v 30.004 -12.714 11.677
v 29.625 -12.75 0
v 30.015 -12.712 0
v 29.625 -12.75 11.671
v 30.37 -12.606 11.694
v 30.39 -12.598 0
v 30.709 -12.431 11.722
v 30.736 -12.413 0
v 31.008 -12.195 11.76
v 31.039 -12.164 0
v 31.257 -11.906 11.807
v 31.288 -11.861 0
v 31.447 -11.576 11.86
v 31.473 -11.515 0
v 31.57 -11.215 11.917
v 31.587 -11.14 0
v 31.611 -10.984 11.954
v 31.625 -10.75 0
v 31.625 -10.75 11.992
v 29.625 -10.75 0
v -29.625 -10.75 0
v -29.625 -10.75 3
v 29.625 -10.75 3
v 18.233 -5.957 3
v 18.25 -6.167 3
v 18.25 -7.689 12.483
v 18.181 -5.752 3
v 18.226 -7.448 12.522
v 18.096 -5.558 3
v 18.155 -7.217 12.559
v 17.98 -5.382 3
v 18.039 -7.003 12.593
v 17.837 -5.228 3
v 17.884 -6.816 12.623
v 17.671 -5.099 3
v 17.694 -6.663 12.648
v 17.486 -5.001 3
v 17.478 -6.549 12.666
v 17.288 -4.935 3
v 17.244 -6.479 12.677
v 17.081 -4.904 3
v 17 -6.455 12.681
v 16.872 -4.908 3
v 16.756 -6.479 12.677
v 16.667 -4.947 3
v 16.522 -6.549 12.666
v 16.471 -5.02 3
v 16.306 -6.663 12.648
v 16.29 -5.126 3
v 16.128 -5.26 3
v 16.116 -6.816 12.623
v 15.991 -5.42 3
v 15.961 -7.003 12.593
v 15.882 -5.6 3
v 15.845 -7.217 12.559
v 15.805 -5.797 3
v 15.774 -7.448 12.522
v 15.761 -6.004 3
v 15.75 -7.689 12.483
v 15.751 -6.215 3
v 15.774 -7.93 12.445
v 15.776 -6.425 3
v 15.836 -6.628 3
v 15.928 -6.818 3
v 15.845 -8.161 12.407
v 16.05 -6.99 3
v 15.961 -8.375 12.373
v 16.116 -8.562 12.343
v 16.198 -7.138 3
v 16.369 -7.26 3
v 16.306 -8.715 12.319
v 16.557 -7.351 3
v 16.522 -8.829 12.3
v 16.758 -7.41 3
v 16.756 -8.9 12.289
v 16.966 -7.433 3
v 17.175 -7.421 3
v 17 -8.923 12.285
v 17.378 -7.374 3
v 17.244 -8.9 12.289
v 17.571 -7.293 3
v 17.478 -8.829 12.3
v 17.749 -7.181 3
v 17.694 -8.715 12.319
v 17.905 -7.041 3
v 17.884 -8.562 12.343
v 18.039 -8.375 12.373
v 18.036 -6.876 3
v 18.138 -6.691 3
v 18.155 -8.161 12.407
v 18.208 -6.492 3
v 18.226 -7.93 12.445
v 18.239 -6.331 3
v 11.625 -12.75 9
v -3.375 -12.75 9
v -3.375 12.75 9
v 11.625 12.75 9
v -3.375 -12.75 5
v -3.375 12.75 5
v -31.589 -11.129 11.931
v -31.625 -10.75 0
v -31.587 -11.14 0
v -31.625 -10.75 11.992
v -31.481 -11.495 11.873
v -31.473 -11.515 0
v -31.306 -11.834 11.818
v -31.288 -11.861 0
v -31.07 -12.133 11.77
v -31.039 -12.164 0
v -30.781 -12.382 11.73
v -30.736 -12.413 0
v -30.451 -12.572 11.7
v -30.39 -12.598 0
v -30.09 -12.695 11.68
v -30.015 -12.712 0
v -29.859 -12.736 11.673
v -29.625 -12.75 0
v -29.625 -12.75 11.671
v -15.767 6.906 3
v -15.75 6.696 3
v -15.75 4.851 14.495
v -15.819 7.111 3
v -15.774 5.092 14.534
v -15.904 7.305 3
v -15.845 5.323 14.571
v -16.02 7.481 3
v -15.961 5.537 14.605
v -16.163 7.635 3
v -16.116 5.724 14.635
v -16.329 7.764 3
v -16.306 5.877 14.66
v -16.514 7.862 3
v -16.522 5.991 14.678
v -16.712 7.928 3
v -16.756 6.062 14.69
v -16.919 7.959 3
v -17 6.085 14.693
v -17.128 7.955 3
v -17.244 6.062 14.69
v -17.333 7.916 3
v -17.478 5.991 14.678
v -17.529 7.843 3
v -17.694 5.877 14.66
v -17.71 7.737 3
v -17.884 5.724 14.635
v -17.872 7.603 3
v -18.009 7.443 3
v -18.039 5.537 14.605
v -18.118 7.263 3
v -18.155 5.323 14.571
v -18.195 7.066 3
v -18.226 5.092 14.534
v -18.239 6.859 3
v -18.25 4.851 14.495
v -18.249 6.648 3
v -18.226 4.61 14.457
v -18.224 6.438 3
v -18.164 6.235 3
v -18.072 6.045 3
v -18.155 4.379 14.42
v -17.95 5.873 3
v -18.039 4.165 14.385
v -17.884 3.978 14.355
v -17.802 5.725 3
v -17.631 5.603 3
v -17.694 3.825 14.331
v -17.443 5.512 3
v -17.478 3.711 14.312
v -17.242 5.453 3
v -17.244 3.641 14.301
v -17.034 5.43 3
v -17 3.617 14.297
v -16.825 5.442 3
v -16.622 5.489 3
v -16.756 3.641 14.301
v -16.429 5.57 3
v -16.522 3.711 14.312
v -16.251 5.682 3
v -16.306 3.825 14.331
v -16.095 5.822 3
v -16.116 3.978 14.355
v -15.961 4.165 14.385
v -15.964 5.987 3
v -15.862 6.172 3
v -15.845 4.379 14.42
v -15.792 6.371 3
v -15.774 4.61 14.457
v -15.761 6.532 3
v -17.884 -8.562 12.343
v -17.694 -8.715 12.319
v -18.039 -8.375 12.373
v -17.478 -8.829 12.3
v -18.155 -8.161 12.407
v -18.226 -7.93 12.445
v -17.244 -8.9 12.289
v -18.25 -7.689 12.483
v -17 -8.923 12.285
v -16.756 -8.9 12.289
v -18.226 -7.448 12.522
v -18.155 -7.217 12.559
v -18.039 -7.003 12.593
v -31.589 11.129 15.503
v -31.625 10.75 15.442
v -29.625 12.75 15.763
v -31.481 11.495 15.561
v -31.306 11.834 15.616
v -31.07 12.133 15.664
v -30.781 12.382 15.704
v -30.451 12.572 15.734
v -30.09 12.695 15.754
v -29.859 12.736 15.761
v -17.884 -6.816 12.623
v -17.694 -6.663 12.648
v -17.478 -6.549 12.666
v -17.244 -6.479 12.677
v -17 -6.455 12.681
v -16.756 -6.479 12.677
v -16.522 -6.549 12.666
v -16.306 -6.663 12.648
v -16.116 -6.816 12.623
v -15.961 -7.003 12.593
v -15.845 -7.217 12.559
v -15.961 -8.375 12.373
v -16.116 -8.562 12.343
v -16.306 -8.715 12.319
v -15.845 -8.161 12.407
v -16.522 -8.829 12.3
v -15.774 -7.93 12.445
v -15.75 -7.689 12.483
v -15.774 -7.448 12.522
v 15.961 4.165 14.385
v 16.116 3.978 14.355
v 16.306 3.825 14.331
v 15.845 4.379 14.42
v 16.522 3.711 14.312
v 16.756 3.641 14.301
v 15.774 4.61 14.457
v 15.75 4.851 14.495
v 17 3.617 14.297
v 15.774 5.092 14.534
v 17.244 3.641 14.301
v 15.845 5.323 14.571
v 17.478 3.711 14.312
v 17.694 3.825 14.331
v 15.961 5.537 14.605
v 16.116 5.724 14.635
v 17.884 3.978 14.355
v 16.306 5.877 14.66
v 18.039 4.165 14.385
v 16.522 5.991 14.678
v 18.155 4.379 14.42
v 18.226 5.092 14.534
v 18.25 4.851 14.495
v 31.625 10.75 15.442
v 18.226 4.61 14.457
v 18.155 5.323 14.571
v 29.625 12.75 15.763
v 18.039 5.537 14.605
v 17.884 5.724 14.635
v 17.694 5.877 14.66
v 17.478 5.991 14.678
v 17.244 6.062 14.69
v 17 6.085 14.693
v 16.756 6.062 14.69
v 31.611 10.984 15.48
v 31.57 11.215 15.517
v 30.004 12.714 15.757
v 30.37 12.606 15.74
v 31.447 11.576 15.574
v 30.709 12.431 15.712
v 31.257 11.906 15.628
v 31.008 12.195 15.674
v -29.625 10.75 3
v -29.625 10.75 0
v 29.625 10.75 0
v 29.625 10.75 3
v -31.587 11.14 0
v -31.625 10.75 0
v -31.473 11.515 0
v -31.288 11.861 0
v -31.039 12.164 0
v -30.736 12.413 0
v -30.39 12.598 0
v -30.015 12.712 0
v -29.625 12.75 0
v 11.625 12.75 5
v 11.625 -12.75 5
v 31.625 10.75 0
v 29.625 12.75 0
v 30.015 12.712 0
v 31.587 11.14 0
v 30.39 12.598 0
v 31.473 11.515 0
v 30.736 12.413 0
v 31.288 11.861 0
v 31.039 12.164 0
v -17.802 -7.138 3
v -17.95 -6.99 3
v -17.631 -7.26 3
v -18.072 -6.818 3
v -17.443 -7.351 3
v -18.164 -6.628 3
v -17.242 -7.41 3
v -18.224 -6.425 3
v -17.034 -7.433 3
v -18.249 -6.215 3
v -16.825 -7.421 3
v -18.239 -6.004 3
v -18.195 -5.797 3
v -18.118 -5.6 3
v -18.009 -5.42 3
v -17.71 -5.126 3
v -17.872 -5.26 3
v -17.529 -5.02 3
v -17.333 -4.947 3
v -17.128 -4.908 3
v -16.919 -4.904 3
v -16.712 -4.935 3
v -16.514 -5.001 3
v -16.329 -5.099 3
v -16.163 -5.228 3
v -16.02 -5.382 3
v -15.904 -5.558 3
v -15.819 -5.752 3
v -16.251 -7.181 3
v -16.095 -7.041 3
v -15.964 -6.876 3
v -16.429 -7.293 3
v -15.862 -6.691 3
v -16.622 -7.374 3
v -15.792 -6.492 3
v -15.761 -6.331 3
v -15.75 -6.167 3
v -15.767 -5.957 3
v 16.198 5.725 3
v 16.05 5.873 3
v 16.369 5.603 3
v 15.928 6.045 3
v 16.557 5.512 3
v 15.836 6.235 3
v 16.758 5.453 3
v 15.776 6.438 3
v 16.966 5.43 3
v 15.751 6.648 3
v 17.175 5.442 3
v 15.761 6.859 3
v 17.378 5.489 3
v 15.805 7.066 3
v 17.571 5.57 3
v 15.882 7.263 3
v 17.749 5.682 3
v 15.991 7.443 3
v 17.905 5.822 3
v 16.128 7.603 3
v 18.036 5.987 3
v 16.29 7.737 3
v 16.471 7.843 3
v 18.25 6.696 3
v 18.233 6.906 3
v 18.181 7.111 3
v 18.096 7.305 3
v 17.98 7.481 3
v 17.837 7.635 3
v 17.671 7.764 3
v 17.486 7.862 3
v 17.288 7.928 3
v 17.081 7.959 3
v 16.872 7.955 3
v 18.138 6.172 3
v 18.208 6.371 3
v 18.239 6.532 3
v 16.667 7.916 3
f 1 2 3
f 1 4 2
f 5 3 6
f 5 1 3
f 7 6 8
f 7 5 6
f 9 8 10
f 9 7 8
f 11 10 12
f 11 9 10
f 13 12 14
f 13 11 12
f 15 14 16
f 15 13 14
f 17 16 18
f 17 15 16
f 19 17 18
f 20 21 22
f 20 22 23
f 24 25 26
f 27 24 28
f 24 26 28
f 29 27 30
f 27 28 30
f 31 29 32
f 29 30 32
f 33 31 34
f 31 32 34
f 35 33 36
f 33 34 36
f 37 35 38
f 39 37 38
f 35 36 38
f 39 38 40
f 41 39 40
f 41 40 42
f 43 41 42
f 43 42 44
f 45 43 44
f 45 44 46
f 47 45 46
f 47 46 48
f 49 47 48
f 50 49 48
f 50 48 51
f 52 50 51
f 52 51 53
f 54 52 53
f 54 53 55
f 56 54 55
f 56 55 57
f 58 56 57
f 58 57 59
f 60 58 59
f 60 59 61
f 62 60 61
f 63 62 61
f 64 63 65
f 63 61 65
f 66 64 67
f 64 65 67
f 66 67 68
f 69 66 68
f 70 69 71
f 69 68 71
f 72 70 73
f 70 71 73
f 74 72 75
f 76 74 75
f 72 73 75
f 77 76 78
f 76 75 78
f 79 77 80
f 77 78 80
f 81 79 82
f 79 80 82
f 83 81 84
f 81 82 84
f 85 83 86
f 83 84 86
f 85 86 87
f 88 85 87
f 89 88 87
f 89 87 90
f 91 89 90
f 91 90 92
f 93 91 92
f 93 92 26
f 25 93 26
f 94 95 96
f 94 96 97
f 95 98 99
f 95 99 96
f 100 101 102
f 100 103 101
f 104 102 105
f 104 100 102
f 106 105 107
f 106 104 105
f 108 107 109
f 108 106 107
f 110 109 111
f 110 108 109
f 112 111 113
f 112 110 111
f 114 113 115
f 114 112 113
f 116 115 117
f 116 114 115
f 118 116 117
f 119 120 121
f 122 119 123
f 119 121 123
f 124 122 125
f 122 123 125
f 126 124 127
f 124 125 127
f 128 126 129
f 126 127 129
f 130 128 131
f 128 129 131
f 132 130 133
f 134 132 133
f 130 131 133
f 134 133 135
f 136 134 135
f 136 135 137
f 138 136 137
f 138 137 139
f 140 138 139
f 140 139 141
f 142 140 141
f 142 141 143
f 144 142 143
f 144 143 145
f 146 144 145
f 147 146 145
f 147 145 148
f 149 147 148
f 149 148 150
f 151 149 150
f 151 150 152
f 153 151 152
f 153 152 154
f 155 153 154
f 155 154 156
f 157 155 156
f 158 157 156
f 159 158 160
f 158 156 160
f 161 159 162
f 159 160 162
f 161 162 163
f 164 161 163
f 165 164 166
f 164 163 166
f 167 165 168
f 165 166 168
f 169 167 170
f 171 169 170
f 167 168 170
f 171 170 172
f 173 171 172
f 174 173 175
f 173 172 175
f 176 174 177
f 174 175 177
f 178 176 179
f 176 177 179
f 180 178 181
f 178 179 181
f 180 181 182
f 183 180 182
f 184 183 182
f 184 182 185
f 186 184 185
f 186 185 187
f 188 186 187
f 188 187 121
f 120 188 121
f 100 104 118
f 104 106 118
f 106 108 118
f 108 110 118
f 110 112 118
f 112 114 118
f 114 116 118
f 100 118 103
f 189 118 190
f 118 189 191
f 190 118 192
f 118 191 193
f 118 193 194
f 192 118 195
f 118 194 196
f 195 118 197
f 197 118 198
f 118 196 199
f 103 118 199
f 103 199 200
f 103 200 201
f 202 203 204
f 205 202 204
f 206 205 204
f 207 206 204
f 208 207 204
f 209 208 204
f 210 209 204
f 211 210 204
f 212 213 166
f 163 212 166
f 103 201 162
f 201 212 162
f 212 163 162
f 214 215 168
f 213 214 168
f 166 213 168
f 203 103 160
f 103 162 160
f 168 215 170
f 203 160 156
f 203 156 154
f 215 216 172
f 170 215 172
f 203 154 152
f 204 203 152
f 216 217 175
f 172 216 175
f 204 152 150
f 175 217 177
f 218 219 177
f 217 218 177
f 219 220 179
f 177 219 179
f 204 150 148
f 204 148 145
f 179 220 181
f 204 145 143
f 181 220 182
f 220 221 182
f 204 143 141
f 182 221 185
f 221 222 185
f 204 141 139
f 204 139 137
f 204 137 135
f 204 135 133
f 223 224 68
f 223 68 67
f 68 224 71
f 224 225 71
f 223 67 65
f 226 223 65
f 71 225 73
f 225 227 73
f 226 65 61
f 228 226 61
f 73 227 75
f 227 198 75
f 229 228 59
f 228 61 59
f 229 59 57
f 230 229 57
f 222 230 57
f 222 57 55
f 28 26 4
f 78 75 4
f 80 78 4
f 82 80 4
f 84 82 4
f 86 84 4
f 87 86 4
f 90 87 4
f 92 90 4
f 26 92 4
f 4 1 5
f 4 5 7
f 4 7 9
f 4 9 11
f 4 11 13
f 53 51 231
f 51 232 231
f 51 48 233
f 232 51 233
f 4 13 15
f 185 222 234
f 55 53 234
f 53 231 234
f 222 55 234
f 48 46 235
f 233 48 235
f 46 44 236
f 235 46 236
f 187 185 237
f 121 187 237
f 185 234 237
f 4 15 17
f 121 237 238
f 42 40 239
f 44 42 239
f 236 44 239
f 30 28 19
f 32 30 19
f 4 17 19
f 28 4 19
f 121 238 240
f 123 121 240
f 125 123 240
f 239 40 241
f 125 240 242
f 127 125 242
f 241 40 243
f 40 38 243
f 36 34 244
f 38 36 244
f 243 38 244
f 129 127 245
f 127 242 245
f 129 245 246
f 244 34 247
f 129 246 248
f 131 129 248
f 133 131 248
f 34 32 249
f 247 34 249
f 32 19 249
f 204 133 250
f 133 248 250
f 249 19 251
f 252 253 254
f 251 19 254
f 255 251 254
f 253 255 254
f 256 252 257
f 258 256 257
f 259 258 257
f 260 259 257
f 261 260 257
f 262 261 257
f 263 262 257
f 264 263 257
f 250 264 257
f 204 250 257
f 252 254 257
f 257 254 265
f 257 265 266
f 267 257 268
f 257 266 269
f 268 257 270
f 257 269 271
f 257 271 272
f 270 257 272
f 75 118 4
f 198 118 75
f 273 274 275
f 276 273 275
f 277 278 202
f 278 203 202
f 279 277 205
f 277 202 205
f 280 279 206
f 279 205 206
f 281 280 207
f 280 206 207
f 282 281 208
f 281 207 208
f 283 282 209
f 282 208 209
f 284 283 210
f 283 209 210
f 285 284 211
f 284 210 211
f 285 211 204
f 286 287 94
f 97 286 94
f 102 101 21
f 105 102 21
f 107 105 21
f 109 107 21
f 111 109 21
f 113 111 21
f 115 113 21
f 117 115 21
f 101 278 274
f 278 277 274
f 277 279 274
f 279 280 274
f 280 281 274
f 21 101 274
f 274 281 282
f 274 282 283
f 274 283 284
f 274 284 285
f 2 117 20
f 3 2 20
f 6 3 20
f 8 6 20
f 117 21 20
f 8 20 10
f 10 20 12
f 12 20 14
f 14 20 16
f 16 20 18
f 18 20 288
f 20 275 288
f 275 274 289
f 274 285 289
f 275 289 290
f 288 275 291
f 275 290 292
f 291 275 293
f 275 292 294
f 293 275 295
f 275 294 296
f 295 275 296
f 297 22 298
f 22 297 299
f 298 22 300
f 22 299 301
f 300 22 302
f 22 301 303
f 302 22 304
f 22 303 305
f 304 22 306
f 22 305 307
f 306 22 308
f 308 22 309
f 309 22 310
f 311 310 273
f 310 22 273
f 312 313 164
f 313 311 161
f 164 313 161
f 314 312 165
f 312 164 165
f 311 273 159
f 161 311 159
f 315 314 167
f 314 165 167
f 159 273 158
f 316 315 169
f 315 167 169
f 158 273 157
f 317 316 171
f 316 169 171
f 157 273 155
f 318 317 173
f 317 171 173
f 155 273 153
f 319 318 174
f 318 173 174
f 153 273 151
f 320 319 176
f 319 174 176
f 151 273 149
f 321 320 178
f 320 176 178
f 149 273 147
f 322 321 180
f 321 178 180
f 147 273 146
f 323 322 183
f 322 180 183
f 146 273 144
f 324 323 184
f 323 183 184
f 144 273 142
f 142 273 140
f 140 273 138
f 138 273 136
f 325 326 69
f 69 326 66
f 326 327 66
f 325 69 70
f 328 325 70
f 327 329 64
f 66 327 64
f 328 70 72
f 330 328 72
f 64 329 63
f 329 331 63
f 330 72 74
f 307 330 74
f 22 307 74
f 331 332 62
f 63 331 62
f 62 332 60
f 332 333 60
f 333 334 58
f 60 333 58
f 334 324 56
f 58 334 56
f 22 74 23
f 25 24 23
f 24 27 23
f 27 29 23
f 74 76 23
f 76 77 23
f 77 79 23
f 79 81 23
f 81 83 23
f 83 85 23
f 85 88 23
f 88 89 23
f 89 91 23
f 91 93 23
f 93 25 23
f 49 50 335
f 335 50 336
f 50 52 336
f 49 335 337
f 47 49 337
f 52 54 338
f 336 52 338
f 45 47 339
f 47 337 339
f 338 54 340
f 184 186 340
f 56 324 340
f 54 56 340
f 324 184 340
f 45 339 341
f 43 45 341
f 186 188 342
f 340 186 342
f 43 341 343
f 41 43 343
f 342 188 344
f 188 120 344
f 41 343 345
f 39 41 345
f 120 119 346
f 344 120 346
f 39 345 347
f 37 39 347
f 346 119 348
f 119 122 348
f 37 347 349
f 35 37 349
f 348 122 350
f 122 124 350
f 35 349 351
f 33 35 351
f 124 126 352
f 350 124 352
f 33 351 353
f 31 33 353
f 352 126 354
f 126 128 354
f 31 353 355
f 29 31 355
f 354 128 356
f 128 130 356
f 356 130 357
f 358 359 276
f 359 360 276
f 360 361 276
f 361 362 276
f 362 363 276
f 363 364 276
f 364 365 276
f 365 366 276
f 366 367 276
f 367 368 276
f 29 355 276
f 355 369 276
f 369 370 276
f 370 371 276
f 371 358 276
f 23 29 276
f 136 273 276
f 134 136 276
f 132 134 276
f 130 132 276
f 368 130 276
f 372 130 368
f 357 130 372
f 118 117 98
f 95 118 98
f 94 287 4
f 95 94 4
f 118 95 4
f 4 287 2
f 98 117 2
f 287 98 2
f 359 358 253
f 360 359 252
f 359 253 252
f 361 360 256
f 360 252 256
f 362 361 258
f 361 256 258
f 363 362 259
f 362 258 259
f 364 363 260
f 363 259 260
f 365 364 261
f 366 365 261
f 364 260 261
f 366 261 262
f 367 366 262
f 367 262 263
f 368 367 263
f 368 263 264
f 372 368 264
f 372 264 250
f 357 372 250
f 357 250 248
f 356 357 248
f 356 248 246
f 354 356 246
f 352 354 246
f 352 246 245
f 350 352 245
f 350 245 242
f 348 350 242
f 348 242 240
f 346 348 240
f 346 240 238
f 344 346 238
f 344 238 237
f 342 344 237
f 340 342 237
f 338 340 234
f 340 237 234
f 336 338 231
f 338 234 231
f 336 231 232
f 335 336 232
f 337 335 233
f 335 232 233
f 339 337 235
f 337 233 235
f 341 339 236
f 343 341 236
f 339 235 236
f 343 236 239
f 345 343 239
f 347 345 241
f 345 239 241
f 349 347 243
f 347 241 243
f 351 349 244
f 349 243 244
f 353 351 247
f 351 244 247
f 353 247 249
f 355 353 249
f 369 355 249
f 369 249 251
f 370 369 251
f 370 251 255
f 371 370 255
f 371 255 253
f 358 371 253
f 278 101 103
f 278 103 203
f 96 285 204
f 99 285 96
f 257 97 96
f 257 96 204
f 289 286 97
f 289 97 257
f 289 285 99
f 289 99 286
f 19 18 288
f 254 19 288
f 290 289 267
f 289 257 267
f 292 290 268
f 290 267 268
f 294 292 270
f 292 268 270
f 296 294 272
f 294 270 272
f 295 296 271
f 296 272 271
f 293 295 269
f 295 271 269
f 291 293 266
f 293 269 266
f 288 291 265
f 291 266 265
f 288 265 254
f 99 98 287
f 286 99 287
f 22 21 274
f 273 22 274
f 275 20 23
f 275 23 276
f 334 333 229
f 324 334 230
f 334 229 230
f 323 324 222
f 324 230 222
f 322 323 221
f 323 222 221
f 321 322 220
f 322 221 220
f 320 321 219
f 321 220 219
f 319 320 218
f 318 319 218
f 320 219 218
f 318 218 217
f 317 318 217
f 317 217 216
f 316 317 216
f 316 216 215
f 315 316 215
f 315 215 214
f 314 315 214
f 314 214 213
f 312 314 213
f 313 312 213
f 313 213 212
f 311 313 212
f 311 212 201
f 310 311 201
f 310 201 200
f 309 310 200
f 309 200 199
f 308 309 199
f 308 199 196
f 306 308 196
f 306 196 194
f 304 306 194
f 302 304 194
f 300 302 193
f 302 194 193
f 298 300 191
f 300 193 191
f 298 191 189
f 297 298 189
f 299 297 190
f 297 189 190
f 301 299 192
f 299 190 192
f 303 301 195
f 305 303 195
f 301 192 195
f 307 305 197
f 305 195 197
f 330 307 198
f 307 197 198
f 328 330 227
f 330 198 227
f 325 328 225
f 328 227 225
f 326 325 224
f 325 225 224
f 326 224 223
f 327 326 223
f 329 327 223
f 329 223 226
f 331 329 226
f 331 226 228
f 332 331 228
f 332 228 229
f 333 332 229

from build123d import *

# Parameters (mm, degrees)
F0_W      = 63.25
F0_H      = 25.5
F0_W_2    = 59.25
F0_H_2    = 21.5
F1_DEPTH  = 20
F3_DEPTH  = 3
F4_DEPTH  = 64
F5_W      = 15
F5_H      = 4
F6_DEPTH  = 30
F8_DEPTH  = 70
F9_R      = 2
F10_R     = 1.25
F11_DEPTH = 25


with BuildPart() as f1:
    # F0 (on Top) → F1 (new body)
    with BuildSketch(Plane.XY):
        Rectangle(F0_W, F0_H)
        Rectangle(F0_W_2, F0_H_2, mode=Mode.SUBTRACT)
        Rectangle(F0_W_2, F0_H_2)
    extrude(amount=F1_DEPTH)

    # F0 (on Top) → F3 (cut)
    with BuildSketch(Plane.XY):
        Rectangle(F0_W_2, F0_H_2)
    extrude(amount=F3_DEPTH, mode=Mode.SUBTRACT)

    # F2 (on face) → F4 (cut)
    with BuildSketch(Plane.YZ.offset(31.625)):
        Polygon((-12.75, 15.9456129), (12.75, 20), (-12.75, 20), align=None)
    extrude(amount=-F4_DEPTH, mode=Mode.SUBTRACT)

    # F5 (on face) → F6 (cut)
    with BuildSketch(Plane.XZ.offset(12.75)):
        with Locations((4.125, 7)):
            Rectangle(F5_W, F5_H)
    extrude(amount=-F6_DEPTH, mode=Mode.SUBTRACT)

    # F7 (on face) → F8 (cut)
    with BuildSketch(Plane.YZ.offset(31.625)):
        Polygon((-12.75, 11.6711445153), (12.75, 15.7628711313), (12.75, 20), (-12.75, 15.9456129), align=None)
    extrude(amount=-F8_DEPTH, mode=Mode.SUBTRACT)

    # F9
    f9_edges = [f1.edges().sort_by_distance(p)[0] for p in [
        (-31.625, 12.75, 7.881436),
        (31.625, 12.75, 7.881436),
        (-31.625, -12.75, 5.835572),
        (31.625, -12.75, 5.835572),
    ]]
    fillet(f9_edges, radius=F9_R)

    # F10 (on face) → F11 (cut)
    with BuildSketch(Plane(origin=(0, -2.1457810388, 13.3726960826), x_dir=(1, 0, 0), z_dir=(0, -0.1584332105, 0.9873696966))):
        with Locations((-17, 7.0863259119)):
            Circle(F10_R)
        with Locations((-17, -5.6142242387)):
            Circle(F10_R)
        with Locations((17, 7.0863259119)):
            Circle(F10_R)
        with Locations((17, -5.6142242387)):
            Circle(F10_R)
    extrude(amount=-F11_DEPTH, mode=Mode.SUBTRACT)


solid = f1.part
